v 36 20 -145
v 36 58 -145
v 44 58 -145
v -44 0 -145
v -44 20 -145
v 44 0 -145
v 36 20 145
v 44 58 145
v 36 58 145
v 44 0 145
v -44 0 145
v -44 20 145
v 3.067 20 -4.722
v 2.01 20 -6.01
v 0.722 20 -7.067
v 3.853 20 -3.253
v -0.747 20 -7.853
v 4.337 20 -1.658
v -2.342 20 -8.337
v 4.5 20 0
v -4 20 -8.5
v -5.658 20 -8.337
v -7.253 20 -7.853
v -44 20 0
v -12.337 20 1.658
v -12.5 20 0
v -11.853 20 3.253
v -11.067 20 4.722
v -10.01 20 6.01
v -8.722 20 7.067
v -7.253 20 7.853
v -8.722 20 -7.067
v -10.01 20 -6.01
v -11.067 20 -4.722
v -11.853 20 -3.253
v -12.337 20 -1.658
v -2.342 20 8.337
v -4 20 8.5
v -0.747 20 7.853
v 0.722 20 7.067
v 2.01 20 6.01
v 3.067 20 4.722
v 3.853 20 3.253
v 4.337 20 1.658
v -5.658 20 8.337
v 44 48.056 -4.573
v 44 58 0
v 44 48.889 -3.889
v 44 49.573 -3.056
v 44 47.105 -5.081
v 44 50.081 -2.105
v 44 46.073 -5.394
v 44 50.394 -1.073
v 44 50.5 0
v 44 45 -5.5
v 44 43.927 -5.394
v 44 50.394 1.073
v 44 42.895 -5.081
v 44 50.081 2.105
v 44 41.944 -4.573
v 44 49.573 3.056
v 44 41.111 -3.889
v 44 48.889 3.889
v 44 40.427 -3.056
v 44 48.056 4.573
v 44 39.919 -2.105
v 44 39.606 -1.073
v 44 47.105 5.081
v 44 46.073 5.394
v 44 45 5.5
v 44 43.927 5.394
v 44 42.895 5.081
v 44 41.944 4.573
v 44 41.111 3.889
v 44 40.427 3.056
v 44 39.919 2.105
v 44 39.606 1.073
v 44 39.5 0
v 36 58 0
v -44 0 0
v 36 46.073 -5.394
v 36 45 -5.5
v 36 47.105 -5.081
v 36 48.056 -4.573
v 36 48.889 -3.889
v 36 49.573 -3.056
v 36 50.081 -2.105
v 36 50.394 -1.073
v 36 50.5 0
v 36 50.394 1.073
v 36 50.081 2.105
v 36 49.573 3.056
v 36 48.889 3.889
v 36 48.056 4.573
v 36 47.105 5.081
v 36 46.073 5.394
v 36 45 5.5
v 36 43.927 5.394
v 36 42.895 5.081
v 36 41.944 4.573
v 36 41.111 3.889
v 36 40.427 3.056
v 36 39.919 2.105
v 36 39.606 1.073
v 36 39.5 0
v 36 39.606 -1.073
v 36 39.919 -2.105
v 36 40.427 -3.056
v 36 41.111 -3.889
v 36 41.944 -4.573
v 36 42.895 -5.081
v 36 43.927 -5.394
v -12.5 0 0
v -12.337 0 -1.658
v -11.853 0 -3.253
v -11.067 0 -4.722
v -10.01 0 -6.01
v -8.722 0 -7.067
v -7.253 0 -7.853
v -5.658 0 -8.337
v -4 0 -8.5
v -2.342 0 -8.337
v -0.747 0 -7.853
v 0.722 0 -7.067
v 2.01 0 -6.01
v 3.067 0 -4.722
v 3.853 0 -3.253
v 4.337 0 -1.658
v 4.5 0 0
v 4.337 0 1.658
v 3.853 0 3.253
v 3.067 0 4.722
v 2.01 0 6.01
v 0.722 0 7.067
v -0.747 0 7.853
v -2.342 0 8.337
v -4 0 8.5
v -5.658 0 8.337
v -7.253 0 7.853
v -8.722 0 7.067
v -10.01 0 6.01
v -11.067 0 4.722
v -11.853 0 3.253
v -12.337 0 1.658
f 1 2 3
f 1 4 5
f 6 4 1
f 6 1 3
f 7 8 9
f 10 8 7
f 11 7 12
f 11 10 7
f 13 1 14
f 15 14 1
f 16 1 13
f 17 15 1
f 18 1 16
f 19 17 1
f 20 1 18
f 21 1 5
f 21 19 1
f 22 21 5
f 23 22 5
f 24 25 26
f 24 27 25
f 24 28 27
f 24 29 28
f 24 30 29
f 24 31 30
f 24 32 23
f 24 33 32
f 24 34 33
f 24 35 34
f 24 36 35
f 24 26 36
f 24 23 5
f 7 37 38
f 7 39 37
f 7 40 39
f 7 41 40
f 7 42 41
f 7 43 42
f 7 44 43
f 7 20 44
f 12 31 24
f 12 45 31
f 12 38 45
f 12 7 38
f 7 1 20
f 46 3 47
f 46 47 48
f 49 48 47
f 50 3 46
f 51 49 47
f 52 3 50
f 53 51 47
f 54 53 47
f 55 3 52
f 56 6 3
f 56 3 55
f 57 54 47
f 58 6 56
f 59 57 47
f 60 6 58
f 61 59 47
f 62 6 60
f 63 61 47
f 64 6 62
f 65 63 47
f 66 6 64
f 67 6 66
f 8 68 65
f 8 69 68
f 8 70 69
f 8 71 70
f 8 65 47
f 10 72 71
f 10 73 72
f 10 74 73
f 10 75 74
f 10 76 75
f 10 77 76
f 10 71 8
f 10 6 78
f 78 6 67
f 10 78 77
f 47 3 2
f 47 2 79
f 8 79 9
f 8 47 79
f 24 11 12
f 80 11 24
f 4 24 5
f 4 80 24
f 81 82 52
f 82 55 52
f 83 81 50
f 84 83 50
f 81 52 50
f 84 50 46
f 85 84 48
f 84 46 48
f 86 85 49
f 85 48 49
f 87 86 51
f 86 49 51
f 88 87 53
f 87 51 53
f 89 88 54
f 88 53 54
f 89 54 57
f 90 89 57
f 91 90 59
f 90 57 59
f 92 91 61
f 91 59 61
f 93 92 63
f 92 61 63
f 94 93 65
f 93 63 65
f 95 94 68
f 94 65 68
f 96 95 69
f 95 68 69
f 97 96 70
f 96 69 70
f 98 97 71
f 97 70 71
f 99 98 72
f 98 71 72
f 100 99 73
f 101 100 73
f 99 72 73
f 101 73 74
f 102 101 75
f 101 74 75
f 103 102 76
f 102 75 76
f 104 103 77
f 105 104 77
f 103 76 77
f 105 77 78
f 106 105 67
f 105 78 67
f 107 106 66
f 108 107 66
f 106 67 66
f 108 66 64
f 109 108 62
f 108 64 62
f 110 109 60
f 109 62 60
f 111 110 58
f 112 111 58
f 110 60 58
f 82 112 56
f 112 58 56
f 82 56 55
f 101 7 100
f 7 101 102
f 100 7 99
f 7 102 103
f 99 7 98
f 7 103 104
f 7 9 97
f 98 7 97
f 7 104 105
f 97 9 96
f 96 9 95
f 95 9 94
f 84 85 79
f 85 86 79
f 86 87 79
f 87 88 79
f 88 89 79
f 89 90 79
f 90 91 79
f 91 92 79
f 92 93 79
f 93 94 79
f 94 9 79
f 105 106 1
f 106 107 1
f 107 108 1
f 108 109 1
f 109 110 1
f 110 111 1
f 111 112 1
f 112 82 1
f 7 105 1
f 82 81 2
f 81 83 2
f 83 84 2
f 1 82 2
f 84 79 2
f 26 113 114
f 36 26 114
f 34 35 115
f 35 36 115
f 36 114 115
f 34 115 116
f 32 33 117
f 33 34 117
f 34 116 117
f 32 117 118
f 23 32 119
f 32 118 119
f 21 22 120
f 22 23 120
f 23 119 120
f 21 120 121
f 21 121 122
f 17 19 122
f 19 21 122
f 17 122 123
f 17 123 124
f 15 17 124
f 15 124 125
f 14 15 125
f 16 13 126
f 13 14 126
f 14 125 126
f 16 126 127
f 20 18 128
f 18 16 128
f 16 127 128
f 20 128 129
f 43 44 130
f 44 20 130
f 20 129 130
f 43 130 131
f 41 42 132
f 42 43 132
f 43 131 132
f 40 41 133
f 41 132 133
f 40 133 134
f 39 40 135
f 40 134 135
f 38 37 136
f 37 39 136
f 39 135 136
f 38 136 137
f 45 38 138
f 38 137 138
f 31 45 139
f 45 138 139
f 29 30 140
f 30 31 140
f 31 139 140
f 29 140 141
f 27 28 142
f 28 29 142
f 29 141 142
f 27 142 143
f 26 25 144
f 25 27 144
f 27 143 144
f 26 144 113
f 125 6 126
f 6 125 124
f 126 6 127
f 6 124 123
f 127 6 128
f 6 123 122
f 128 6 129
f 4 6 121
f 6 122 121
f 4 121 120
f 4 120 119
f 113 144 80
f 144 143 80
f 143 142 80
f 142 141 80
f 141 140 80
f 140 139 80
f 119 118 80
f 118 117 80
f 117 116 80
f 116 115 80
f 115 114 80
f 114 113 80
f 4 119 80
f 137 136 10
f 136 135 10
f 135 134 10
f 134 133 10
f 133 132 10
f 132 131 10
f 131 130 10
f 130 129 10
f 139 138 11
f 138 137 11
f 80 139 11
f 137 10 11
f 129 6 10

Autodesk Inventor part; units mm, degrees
ref_plane "YZ Plane" through (0, 0, 0) normal (1, 0, 0) x (0, 1, 0)
ref_plane "XZ Plane" through (0, 0, 0) normal (0, 1, 0) x (-1, 0, 0)
ref_plane "XY Plane" through (0, 0, 0) normal (0, 0, 1) x (1, 0, 0)
sketch "Эскиз1" plane through (0, 0, 0) normal (0, 1, 0) x (-1, 0, 0)
  line L0 (-44, 145) -> (44, 145)
  line L1 (44, 145) -> (44, -145)
  line L2 (44, -145) -> (-44, -145)
  line L3 (-44, -145) -> (-44, 145)
  line L4 (-44, 145) -> (44, -145) construction
  line L5 (44, 145) -> (-44, -145) construction
  line L6 (44, 0) -> (4, 0)
  circle A0 centre (4, 0) radius 8.5
  point P0 (0, 0)
  dimension "d0" = 88
  dimension "d1" = 290
  dimension "d2" = 40
  dimension "d3" = 17
extrude "Выдавливание1" add sketch "Эскиз1" along normal blind 20
sketch "Эскиз2" plane through (44, 0, 145) normal (1, 0, 0) x (0, 0, -1)
  line L0 (0, 0) -> (290, 0)
  line L1 (290, 0) -> (290, 58)
  line L2 (290, 58) -> (0, 58)
  line L3 (0, 58) -> (0, 0)
  line L4 (0, 58) -> (145, 58)
  line L5 (145, 58) -> (145, 45)
  circle A0 centre (145, 45) radius 5.5
  point P0 (145, 0)
  dimension "d6" = 58
  dimension "d7" = 145
  dimension "d8" = 13
  dimension "d9" = 11
extrude "Выдавливание2" add sketch "Эскиз2" against normal blind 8
properties part number "Угольник-10"
